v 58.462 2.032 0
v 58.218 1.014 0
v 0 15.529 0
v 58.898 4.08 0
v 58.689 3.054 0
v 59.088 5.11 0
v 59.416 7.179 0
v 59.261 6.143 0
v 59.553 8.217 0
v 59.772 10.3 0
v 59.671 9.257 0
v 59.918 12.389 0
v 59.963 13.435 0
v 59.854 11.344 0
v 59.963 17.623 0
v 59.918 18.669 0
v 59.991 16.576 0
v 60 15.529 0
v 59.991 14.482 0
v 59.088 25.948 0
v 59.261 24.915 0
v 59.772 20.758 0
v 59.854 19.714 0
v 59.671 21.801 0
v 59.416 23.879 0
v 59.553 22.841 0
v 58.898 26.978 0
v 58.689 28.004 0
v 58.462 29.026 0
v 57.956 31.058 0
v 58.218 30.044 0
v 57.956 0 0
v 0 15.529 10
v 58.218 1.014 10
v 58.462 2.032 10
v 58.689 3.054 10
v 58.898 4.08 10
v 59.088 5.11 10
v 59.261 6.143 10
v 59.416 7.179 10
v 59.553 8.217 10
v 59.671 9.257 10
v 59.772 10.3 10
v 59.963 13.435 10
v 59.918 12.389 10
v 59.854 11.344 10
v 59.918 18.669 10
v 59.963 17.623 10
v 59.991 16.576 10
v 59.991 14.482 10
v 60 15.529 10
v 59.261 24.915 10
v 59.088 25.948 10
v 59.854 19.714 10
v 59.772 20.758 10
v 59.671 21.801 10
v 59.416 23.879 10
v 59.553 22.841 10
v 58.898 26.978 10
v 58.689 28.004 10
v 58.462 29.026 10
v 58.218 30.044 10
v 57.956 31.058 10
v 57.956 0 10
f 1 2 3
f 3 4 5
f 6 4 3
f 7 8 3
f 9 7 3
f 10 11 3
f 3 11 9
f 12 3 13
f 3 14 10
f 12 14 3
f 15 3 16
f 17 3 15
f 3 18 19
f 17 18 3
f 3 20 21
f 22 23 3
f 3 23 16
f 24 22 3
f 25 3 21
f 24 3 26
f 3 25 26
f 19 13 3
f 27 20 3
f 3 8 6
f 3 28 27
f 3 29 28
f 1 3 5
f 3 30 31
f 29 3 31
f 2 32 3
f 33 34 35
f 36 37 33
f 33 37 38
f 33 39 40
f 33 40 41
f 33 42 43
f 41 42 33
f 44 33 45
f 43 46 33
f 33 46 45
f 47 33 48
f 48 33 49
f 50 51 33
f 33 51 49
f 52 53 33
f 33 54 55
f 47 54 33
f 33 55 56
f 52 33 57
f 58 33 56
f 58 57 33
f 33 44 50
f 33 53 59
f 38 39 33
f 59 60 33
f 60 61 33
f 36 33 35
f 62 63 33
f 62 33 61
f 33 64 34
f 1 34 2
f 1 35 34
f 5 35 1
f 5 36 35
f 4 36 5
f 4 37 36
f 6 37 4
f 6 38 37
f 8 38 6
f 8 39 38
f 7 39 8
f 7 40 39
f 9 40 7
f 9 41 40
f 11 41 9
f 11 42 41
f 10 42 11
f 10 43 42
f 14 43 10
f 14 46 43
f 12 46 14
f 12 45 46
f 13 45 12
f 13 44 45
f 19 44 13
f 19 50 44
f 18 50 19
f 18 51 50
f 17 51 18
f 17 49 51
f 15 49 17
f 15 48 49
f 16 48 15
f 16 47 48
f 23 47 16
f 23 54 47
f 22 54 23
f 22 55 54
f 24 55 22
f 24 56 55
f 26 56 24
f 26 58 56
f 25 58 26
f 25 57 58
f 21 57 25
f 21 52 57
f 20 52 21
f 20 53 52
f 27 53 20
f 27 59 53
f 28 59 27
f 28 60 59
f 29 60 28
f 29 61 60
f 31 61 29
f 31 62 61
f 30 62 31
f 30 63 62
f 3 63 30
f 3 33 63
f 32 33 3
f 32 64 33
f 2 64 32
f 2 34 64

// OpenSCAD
$fn = 32;

// ----------------------------------------------------------------------
// Arc profile plate: sector, 32 points
// ----------------------------------------------------------------------

// --- parameters (mm) ---
sector_angle = 30;        // sector angle, degrees
sector_r = 60;            // outer radius
arc_step = 1;             // sampling step of the arc, degrees
plate_t = 10;             // plate thickness, Z

bbox_x = 2 * sector_r * sin(sector_angle / 2);  // chord of the sector
bbox_y = sector_r;  // depth of the sector (apex to arc)

profile = [[57.956, 0], [58.218, 1.014], [58.462, 2.032], [58.689, 3.054], [58.898, 4.08], [59.088, 5.11], [59.261, 6.143], [59.416, 7.179], [59.553, 8.217], [59.671, 9.257], [59.772, 10.3], [59.854, 11.344], [59.918, 12.389], [59.963, 13.435], [59.991, 14.482], [60, 15.529], [59.991, 16.576], [59.963, 17.623], [59.918, 18.669], [59.854, 19.714], [59.772, 20.758], [59.671, 21.801], [59.553, 22.841], [59.416, 23.879], [59.261, 24.915], [59.088, 25.948], [58.898, 26.978], [58.689, 28.004], [58.462, 29.026], [58.218, 30.044], [57.956, 31.058], [0, 15.529]];  // primary outline, 32 points, counter clockwise

// --- the one profile operation ---
linear_extrude(height = plate_t) polygon(points = profile);
